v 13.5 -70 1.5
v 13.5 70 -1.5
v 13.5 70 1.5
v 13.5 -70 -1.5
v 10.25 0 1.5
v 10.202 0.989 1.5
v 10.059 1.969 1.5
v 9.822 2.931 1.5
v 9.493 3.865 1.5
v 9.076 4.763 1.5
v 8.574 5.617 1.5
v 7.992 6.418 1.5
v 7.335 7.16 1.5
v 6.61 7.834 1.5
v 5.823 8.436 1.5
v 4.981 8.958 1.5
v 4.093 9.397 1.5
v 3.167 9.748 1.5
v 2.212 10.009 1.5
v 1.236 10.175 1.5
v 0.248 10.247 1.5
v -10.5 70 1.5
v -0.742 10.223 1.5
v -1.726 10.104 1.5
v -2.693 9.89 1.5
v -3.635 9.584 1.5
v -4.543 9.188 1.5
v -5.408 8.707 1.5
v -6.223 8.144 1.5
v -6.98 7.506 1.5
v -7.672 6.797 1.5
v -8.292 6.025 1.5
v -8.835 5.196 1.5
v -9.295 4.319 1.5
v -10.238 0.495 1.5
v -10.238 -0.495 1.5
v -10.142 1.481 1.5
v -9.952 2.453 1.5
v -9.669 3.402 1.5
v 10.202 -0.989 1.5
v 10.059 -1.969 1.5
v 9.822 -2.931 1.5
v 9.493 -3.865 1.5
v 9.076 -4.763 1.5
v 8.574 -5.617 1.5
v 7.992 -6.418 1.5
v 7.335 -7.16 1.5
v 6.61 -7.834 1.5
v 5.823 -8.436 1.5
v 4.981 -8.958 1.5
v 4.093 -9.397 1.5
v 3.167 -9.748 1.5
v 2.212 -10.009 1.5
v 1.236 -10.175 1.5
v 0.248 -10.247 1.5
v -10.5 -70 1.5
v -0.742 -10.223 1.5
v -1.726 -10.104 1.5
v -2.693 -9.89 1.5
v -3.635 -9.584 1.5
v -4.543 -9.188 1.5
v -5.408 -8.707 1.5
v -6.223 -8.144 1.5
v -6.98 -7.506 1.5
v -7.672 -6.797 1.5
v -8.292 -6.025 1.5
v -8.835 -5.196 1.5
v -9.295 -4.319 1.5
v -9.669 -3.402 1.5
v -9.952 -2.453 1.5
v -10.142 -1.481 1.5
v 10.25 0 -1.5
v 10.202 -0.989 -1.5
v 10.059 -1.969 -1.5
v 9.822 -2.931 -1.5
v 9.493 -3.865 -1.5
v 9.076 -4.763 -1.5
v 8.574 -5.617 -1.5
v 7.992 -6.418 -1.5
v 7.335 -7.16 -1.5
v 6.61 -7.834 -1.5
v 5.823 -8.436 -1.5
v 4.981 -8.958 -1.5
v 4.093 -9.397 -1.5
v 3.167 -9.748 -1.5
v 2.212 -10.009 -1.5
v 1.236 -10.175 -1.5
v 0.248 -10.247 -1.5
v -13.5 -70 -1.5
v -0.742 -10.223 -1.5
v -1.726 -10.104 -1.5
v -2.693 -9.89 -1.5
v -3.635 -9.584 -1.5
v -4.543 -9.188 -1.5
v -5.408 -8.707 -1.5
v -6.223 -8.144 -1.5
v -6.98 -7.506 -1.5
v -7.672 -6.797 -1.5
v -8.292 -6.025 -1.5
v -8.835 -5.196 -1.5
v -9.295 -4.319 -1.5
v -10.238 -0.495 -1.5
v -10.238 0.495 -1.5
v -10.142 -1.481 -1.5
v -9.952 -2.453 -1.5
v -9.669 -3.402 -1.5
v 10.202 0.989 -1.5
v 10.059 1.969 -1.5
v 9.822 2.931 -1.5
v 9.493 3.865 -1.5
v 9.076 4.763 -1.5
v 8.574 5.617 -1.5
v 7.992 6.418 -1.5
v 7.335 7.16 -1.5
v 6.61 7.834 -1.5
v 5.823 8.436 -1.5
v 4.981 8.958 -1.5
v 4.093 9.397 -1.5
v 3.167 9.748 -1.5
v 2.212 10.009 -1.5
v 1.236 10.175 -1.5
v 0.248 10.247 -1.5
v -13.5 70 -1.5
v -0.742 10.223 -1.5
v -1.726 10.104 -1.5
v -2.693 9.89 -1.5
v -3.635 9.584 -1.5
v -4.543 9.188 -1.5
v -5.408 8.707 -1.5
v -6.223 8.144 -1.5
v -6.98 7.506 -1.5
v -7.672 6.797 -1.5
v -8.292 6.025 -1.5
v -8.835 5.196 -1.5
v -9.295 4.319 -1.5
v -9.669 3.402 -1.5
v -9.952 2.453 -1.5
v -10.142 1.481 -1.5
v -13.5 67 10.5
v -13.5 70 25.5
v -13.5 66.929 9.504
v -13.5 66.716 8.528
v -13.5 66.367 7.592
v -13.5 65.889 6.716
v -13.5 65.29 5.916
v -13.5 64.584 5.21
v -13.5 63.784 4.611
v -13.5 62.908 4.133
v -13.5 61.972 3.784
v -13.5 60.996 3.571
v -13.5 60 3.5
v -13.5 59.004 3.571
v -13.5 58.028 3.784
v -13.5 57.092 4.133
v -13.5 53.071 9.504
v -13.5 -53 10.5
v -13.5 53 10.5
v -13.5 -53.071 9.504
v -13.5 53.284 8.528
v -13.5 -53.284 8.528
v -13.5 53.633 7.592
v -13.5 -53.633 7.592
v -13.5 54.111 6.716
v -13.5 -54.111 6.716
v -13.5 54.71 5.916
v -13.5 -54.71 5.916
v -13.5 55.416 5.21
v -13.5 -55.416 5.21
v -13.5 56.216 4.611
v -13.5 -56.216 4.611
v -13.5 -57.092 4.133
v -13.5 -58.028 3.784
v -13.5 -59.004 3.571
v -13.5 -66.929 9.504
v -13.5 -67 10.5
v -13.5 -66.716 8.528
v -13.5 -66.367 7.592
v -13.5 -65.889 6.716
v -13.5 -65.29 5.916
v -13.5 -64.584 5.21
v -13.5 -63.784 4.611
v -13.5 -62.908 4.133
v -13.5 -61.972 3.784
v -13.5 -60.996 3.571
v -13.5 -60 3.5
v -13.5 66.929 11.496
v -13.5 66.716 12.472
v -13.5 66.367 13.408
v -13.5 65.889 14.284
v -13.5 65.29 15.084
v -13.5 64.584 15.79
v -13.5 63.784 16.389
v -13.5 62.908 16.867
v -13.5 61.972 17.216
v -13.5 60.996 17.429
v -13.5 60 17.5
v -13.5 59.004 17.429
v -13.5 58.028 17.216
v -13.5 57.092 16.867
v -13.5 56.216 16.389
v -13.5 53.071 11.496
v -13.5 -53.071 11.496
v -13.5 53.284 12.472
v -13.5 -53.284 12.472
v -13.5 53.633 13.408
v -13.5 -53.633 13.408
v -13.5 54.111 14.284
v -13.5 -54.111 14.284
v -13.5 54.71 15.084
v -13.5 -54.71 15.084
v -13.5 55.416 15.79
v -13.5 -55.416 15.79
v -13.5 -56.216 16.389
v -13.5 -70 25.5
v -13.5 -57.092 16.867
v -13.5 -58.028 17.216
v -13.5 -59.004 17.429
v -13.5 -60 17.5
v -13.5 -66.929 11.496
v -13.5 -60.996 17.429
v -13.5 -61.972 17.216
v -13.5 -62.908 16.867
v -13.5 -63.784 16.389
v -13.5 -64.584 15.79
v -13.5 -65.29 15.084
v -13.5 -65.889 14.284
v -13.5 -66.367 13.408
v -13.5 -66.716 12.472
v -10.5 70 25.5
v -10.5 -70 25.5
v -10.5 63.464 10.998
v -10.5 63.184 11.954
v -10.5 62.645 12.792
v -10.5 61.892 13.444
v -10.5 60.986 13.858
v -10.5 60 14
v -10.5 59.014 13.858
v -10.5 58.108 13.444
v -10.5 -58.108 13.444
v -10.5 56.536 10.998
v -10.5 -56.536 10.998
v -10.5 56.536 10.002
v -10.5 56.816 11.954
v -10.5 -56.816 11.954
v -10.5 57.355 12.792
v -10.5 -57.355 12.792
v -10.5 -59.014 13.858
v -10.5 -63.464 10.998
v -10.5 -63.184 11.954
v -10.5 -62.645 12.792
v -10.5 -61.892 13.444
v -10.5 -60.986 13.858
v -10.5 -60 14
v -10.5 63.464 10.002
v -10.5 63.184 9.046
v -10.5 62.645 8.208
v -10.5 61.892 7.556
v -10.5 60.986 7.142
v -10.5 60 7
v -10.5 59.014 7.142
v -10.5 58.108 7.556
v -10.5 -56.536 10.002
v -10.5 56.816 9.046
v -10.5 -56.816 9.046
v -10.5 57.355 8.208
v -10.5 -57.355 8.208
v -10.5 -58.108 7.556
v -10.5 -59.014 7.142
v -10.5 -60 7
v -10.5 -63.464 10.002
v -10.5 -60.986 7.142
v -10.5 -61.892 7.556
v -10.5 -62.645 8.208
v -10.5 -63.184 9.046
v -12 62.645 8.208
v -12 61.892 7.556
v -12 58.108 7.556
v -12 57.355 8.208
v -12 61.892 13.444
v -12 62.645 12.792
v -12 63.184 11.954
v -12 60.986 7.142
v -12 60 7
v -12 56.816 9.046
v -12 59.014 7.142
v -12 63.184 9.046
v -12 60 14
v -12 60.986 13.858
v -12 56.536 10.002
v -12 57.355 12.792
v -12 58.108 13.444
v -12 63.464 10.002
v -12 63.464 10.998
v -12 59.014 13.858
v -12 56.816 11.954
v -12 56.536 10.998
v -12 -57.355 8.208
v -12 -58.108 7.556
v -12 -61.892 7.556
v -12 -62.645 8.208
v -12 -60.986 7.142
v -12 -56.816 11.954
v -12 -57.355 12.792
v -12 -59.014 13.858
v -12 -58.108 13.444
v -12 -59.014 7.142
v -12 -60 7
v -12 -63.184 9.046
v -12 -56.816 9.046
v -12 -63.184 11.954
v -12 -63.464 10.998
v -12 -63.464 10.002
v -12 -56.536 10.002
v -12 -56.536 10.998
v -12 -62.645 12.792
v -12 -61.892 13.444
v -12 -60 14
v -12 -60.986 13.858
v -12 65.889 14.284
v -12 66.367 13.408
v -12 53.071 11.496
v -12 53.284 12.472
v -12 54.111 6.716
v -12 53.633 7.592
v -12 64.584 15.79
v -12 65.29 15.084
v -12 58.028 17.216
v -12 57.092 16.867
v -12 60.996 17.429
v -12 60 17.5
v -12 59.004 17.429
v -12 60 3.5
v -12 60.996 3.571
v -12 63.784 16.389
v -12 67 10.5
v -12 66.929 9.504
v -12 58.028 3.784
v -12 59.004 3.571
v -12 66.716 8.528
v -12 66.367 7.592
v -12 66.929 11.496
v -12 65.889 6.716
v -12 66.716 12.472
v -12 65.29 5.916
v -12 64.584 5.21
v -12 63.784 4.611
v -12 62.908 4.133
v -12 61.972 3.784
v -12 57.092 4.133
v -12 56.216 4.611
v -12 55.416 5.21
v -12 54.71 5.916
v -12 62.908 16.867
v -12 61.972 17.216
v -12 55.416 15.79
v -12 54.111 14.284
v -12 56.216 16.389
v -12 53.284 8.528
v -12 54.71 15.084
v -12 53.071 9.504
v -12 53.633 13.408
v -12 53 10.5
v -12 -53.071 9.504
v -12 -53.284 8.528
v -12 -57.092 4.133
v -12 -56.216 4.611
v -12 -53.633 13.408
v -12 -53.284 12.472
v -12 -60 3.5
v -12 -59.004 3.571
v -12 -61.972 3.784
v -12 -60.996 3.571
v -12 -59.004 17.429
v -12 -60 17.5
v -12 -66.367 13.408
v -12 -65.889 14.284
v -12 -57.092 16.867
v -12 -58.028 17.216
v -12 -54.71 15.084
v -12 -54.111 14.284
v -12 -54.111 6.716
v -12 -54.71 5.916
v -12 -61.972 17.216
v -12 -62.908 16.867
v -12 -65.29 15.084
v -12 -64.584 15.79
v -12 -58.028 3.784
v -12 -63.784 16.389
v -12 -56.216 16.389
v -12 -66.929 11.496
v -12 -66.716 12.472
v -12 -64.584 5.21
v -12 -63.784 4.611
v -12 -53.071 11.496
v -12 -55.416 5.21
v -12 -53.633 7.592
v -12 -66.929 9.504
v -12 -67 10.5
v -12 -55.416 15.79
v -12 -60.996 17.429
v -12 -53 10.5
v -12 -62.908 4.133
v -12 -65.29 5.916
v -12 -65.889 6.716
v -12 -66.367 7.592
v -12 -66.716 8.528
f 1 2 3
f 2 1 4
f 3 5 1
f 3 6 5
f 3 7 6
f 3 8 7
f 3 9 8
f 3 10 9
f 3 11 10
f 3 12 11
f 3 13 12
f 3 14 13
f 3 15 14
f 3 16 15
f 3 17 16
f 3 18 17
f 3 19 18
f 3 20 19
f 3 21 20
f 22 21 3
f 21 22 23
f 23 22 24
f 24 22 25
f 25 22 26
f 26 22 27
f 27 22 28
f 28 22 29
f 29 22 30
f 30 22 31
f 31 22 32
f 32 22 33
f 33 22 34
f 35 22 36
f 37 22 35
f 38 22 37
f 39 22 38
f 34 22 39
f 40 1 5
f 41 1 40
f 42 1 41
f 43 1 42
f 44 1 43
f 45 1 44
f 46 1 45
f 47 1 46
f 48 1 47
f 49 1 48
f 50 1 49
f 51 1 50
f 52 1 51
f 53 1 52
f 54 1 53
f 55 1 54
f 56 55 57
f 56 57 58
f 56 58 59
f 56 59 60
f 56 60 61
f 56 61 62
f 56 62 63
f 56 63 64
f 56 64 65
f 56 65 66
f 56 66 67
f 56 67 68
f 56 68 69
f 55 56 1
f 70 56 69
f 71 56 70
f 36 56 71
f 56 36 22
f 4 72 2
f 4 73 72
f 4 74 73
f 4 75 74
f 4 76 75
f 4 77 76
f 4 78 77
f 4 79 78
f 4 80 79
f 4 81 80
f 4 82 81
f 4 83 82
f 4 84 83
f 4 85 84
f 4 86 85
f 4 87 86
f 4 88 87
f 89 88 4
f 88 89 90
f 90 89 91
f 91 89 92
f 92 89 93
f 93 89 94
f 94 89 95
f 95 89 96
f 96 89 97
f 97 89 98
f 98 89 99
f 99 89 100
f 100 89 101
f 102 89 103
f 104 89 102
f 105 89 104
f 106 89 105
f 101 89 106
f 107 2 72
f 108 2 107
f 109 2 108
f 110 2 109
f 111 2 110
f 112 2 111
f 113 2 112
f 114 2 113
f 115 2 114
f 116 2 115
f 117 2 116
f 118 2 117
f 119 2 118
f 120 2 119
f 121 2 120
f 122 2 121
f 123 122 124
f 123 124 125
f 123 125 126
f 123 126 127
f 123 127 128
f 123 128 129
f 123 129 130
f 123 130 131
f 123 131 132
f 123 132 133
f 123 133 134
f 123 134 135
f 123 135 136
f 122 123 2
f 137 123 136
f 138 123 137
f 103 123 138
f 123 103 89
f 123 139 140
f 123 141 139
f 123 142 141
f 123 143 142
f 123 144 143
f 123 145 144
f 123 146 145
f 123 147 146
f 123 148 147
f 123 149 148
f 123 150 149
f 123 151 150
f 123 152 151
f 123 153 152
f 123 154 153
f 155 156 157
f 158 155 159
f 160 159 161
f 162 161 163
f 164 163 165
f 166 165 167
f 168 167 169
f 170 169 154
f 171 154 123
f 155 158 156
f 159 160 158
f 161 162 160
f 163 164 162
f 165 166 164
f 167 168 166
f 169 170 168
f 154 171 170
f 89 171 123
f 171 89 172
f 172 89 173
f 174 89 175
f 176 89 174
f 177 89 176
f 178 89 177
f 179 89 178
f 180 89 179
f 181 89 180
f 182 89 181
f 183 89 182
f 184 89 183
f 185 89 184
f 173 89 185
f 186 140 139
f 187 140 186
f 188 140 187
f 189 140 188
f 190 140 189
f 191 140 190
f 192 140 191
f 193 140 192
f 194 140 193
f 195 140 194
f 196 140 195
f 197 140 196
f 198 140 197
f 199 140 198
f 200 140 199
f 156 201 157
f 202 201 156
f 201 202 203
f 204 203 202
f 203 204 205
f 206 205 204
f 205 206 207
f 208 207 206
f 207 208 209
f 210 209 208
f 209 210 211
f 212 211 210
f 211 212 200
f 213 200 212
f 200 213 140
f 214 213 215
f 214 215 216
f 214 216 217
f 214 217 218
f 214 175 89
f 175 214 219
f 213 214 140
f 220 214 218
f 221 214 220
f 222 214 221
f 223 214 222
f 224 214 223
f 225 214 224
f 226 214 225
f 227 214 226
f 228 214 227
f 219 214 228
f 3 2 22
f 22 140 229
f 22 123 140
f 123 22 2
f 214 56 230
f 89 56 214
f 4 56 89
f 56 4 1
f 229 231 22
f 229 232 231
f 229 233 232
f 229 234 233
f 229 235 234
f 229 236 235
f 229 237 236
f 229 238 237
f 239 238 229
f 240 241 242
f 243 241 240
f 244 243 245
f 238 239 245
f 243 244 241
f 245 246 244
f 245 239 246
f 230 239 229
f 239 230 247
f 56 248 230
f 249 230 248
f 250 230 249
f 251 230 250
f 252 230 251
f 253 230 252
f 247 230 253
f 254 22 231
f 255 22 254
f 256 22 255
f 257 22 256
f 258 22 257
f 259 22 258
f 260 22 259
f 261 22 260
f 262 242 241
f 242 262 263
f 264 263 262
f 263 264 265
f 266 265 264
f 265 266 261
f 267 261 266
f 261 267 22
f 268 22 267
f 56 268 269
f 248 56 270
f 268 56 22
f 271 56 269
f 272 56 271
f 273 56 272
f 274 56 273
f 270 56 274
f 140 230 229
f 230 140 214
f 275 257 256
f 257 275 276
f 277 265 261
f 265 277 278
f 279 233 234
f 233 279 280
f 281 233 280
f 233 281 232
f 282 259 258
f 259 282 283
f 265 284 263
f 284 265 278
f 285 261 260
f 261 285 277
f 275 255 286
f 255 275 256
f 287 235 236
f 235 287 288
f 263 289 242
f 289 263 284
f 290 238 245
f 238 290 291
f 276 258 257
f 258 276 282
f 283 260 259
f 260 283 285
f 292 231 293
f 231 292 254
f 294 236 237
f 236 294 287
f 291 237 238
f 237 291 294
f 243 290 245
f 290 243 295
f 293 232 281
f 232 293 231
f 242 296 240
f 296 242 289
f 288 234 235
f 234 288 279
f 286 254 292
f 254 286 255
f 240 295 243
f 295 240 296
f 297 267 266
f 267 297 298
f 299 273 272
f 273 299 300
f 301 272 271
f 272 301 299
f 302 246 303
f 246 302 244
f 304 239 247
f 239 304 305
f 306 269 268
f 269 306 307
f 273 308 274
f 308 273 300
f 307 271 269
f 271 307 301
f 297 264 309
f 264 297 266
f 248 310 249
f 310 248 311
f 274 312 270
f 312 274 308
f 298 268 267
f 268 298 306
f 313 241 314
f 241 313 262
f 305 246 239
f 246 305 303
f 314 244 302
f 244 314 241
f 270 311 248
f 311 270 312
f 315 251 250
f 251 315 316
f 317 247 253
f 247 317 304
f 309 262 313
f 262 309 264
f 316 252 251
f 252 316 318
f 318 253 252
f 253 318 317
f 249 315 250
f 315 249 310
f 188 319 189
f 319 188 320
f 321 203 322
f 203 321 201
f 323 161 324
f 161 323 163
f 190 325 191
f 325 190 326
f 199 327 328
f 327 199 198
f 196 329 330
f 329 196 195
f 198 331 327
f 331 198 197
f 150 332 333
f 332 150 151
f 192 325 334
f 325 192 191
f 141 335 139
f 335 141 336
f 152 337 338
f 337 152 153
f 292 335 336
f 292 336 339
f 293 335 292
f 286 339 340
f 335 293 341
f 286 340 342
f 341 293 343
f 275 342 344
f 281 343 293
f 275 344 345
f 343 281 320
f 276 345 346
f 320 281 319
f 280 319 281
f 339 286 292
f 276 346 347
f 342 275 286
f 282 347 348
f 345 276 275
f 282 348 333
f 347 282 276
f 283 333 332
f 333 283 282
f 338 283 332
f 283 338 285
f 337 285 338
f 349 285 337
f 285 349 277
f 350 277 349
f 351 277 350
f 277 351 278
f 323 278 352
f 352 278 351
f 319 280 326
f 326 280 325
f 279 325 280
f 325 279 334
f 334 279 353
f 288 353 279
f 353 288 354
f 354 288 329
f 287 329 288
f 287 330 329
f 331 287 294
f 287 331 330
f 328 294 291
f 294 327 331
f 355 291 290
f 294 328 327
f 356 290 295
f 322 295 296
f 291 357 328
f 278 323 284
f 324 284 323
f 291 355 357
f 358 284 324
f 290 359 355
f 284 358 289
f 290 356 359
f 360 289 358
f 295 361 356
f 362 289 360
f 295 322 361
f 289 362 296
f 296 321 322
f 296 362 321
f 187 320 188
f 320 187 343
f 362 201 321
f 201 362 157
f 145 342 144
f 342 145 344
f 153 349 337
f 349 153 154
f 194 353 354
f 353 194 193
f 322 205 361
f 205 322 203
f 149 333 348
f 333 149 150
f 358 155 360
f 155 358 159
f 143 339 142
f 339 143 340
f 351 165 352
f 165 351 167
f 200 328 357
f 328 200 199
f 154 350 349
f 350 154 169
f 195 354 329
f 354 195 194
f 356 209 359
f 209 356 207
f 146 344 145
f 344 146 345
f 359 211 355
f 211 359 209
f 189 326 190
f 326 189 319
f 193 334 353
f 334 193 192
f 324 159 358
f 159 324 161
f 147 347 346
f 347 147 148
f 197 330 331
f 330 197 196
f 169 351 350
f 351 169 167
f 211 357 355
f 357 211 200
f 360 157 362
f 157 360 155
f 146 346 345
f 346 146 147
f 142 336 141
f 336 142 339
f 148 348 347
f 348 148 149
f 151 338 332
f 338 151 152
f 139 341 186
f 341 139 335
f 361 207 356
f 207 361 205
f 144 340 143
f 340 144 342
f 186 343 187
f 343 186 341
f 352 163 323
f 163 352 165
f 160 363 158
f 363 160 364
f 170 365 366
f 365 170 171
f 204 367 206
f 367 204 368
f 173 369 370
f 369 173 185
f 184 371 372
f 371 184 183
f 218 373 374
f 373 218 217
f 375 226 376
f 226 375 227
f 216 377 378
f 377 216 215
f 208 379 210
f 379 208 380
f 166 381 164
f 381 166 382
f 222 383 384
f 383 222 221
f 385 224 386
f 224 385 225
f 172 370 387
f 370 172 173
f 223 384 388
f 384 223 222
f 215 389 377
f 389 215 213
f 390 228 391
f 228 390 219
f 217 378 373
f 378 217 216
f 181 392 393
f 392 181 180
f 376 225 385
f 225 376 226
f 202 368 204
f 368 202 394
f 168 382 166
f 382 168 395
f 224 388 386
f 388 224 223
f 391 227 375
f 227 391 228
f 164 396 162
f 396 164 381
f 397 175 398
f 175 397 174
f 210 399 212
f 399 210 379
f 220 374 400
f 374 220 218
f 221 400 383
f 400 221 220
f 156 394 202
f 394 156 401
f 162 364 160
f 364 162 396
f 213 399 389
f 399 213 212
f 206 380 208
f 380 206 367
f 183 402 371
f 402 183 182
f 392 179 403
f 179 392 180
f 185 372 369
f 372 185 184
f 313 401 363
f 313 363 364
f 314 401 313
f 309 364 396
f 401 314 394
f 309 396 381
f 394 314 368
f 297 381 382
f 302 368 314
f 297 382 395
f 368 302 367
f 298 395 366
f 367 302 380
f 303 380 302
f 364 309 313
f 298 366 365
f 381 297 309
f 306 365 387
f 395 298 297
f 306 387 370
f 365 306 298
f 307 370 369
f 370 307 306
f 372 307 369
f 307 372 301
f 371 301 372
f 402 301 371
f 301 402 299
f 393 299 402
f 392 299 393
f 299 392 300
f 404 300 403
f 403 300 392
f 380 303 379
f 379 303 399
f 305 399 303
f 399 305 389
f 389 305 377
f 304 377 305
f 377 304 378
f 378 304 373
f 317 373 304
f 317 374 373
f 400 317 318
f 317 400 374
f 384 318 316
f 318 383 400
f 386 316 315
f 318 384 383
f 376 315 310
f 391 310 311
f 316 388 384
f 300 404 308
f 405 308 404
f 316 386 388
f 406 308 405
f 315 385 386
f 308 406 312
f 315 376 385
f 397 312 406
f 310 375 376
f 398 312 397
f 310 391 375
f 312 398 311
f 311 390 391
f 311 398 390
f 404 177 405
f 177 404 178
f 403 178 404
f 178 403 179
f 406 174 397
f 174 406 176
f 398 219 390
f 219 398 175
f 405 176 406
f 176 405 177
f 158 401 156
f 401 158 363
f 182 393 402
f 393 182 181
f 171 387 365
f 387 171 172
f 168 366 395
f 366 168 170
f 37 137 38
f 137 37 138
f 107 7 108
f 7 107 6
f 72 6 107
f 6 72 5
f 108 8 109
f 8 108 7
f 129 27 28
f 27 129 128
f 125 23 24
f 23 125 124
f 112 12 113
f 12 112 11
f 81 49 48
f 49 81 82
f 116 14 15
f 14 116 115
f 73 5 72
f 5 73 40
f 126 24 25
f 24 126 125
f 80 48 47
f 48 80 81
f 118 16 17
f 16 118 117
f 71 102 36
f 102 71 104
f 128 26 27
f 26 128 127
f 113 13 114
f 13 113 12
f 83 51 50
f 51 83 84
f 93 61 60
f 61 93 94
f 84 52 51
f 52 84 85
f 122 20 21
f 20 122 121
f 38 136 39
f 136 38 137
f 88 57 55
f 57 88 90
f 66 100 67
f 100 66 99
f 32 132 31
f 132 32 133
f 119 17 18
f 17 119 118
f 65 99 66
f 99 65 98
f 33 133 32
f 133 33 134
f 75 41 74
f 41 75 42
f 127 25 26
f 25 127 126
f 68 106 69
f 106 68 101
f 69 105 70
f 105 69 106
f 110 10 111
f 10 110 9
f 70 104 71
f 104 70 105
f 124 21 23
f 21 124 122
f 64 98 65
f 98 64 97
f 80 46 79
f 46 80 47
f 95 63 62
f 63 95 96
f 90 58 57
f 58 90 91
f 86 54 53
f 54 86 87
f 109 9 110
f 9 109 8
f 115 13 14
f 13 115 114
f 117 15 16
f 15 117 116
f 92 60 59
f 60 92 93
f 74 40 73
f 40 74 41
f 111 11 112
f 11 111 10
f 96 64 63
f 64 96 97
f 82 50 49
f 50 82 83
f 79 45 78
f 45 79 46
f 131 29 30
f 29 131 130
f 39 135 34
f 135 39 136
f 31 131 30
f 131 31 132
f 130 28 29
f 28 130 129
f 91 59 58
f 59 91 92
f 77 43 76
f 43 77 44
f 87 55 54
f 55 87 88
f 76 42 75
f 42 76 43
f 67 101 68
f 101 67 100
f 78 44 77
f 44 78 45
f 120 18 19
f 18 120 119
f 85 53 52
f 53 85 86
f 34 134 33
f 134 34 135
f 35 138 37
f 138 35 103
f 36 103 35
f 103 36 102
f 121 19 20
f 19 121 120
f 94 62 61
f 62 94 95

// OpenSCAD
$fa=4;
$fs=1;
// Units are milimeters

antennia_hole_dia=20.5;
mount_hole_dia=7;
mount_hole_offset=15;
hole_center_len=120;
length=140;
thickness=3;
height=27;
countersink_dia=14;
countersink_dep=1.5;

module bracket() {
	cube([height,length,thickness], true);
	translate([-(height/2)+(thickness/2), 0, height/2-thickness/2])
		cube([thickness,length,height],true);
}

module antennia_hole() {
	cylinder(h=10, r=antennia_hole_dia/2, center=true);
}

module mount_holes() {
	translate([-height/2,hole_center_len/2,(height-mount_hole_offset)-(thickness/2)])
	rotate([0,90,0])
		cylinder(h=10, r=mount_hole_dia/2, center=true);
	
	translate([-height/2,-hole_center_len/2,(height-mount_hole_offset)-(thickness/2)])
	rotate([0,90,0])
		cylinder(h=10, r=mount_hole_dia/2, center=true);
}

module bracket_hole() {
	difference() {
		bracket();
		cylinder(h=10, r=antennia_hole_dia/2, center=true);
	}
}

module countersink() {
	translate([-height/2+countersink_dep,hole_center_len/2,(height-mount_hole_offset)-(thickness/2)])
	rotate([0,-90,0])
		cylinder(h=10, r=countersink_dia/2, center=false);
	translate([-height/2+countersink_dep,-hole_center_len/2,(height-mount_hole_offset)-(thickness/2)])
	rotate([0,-90,0])
		cylinder(h=10, r=countersink_dia/2, center=false);
}

difference() {
	bracket();
	antennia_hole();
	mount_holes();
	countersink();
}
